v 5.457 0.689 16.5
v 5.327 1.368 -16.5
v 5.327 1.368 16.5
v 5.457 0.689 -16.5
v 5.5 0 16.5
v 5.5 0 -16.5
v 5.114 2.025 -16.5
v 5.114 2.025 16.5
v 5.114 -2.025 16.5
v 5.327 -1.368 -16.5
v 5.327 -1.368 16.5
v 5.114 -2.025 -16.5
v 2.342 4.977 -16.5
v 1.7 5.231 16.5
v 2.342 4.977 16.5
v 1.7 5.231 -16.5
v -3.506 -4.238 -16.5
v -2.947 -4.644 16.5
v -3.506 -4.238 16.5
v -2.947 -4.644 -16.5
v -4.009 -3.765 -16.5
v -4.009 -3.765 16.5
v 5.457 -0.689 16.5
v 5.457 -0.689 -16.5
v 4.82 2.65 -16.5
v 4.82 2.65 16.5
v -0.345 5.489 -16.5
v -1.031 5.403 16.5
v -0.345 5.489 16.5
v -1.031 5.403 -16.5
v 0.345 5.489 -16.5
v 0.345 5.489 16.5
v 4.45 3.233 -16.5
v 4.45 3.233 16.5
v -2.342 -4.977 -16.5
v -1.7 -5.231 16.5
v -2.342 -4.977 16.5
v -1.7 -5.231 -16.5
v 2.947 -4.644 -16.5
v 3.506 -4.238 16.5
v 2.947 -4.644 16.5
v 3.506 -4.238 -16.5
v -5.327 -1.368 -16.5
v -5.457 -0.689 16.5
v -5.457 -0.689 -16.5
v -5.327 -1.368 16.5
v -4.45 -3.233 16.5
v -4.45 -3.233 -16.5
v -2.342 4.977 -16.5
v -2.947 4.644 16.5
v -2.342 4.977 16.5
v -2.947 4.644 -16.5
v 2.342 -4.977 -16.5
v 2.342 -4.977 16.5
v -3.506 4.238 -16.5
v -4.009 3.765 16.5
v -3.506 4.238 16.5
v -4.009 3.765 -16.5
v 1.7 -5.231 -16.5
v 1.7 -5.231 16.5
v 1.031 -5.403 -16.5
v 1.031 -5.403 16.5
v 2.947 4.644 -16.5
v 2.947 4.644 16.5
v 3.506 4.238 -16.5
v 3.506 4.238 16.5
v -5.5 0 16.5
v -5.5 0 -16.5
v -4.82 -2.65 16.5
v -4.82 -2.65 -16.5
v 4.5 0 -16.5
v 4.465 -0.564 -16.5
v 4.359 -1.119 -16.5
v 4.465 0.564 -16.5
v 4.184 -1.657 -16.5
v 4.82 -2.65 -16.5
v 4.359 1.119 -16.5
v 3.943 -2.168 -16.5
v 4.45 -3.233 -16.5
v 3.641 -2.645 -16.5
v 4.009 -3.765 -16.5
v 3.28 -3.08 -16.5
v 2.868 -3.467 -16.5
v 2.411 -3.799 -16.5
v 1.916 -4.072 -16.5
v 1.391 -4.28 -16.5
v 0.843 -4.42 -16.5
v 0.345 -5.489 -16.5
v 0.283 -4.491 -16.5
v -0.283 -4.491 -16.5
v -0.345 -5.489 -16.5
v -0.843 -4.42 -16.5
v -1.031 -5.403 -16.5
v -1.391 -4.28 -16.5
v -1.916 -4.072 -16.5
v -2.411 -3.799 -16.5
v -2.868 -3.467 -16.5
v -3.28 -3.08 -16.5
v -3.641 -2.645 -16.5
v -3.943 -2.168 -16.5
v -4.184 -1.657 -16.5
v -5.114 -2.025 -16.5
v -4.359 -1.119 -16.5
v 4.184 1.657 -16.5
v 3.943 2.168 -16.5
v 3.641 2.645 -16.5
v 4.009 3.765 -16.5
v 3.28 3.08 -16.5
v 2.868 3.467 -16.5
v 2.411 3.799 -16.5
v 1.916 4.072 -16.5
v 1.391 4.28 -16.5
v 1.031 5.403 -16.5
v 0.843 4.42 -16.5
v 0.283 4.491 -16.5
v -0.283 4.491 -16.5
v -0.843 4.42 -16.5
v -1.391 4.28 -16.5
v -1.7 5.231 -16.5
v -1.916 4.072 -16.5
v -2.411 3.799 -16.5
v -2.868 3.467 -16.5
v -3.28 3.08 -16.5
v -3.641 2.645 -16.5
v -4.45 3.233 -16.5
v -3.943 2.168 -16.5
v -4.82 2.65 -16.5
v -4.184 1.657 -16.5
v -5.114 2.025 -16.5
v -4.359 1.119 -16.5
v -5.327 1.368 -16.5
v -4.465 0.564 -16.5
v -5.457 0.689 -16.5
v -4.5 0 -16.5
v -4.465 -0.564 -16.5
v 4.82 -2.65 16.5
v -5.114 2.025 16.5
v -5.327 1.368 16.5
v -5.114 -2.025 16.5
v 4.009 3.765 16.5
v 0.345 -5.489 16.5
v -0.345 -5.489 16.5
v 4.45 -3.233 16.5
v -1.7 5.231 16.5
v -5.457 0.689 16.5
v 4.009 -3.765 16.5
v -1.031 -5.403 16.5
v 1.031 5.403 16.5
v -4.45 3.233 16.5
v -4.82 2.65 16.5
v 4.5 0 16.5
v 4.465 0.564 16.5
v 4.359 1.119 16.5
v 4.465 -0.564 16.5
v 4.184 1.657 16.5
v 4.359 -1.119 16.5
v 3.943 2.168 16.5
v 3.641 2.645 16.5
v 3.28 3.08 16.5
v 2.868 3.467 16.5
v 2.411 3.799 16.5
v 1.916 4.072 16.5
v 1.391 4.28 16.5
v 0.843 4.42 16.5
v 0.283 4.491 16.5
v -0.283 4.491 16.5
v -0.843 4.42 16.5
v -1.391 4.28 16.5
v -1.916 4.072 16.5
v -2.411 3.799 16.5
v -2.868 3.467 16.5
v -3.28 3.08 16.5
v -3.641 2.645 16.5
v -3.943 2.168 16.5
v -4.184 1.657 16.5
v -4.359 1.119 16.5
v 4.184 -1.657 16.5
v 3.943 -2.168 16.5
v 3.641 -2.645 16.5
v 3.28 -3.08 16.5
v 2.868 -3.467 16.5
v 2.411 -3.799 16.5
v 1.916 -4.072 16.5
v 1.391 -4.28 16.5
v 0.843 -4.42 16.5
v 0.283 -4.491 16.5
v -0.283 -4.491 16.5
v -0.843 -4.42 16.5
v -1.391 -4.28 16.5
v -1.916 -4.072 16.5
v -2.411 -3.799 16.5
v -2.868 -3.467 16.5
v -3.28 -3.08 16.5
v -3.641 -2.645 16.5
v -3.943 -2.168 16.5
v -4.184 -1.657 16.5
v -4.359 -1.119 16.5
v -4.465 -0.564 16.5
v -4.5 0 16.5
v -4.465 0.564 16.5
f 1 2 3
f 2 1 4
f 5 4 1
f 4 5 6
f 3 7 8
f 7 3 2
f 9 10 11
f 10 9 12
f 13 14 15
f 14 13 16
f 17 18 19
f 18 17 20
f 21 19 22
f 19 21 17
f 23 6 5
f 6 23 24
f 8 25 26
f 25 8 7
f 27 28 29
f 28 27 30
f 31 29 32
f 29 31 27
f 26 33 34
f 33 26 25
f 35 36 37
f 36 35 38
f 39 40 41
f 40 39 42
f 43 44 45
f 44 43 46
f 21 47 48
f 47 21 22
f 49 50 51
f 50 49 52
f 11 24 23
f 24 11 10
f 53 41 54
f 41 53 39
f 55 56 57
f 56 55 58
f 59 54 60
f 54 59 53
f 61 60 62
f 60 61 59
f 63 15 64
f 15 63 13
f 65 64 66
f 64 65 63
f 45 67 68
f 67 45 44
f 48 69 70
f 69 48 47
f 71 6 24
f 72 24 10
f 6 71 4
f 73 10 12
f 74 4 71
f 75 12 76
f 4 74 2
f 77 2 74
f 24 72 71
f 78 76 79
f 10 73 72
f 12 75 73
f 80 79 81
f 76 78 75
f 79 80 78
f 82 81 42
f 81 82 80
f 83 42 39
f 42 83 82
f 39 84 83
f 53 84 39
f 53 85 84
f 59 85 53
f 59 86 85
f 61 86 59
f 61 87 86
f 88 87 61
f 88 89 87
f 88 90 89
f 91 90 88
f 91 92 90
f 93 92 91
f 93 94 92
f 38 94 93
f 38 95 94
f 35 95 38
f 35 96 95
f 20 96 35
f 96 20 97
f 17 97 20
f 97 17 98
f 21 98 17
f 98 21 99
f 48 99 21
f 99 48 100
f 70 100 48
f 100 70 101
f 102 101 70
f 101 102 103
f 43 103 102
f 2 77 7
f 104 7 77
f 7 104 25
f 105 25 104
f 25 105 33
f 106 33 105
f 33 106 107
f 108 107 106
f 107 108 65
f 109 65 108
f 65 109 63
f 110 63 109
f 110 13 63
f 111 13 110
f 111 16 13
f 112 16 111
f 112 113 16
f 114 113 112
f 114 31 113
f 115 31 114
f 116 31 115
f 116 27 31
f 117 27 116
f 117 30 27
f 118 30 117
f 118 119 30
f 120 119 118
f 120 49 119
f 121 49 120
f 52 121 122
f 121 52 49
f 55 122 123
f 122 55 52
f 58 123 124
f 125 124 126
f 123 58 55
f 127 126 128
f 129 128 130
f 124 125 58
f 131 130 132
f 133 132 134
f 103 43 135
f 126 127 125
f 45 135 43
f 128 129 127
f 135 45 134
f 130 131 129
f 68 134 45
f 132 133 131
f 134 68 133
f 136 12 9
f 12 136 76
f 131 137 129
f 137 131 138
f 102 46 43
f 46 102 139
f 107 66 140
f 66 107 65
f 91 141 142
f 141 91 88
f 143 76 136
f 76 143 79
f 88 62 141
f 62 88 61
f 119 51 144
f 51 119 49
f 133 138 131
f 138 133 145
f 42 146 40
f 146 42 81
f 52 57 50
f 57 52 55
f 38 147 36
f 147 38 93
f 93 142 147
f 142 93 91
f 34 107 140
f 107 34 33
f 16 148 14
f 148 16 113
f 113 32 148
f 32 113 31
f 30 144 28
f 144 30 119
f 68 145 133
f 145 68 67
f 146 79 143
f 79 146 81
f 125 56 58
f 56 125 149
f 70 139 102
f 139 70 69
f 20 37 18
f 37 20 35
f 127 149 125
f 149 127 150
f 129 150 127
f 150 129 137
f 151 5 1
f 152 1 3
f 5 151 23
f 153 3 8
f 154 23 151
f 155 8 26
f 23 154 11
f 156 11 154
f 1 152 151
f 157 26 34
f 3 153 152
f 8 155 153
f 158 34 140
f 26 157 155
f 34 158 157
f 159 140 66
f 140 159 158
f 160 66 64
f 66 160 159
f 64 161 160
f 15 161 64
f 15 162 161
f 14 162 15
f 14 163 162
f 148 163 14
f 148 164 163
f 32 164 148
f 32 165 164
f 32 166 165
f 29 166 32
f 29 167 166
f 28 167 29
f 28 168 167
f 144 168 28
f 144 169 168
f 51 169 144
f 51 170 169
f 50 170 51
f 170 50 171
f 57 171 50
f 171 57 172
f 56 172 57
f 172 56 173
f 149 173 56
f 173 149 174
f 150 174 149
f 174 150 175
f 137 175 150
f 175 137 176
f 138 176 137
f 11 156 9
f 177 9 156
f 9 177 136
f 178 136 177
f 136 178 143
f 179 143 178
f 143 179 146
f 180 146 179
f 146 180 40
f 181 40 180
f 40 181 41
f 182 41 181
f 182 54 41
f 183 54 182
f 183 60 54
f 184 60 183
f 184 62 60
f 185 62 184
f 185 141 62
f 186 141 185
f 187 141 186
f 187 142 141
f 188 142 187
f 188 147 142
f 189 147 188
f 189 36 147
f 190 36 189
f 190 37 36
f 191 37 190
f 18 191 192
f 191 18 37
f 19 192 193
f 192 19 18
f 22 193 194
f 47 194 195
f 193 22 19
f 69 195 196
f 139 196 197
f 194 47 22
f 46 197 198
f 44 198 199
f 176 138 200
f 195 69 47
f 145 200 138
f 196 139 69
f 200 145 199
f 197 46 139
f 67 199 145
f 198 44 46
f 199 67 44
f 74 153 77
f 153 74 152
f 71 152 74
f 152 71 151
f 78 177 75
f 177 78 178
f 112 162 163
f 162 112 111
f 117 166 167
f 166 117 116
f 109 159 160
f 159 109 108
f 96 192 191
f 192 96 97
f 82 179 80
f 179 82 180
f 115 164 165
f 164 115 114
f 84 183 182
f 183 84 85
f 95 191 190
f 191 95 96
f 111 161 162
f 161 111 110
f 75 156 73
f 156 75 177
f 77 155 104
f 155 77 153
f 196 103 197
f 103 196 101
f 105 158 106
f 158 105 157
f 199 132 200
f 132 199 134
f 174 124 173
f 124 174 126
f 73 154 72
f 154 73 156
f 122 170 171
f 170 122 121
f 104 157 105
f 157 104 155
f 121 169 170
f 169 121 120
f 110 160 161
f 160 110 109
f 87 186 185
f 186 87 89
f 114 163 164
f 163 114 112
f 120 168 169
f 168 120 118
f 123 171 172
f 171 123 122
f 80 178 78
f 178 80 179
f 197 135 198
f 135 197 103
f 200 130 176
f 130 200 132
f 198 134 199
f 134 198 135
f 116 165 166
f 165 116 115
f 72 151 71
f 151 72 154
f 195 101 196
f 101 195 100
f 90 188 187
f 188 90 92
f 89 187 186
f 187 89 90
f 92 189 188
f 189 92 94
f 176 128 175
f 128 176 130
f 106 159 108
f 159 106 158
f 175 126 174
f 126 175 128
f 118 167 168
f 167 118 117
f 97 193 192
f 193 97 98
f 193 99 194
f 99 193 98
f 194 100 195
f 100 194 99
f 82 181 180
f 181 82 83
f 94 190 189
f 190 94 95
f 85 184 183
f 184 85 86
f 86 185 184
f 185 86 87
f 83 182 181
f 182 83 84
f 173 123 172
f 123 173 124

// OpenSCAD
$fn = 50;


difference() {
	union() {
		translate(v = [0, 0, -16.5000000000]) {
			cylinder(h = 33, r = 5.5000000000);
		}
	}
	union() {
		translate(v = [0, 0, -100.0000000000]) {
			cylinder(h = 200, r = 4.5000000000);
		}
	}
}
